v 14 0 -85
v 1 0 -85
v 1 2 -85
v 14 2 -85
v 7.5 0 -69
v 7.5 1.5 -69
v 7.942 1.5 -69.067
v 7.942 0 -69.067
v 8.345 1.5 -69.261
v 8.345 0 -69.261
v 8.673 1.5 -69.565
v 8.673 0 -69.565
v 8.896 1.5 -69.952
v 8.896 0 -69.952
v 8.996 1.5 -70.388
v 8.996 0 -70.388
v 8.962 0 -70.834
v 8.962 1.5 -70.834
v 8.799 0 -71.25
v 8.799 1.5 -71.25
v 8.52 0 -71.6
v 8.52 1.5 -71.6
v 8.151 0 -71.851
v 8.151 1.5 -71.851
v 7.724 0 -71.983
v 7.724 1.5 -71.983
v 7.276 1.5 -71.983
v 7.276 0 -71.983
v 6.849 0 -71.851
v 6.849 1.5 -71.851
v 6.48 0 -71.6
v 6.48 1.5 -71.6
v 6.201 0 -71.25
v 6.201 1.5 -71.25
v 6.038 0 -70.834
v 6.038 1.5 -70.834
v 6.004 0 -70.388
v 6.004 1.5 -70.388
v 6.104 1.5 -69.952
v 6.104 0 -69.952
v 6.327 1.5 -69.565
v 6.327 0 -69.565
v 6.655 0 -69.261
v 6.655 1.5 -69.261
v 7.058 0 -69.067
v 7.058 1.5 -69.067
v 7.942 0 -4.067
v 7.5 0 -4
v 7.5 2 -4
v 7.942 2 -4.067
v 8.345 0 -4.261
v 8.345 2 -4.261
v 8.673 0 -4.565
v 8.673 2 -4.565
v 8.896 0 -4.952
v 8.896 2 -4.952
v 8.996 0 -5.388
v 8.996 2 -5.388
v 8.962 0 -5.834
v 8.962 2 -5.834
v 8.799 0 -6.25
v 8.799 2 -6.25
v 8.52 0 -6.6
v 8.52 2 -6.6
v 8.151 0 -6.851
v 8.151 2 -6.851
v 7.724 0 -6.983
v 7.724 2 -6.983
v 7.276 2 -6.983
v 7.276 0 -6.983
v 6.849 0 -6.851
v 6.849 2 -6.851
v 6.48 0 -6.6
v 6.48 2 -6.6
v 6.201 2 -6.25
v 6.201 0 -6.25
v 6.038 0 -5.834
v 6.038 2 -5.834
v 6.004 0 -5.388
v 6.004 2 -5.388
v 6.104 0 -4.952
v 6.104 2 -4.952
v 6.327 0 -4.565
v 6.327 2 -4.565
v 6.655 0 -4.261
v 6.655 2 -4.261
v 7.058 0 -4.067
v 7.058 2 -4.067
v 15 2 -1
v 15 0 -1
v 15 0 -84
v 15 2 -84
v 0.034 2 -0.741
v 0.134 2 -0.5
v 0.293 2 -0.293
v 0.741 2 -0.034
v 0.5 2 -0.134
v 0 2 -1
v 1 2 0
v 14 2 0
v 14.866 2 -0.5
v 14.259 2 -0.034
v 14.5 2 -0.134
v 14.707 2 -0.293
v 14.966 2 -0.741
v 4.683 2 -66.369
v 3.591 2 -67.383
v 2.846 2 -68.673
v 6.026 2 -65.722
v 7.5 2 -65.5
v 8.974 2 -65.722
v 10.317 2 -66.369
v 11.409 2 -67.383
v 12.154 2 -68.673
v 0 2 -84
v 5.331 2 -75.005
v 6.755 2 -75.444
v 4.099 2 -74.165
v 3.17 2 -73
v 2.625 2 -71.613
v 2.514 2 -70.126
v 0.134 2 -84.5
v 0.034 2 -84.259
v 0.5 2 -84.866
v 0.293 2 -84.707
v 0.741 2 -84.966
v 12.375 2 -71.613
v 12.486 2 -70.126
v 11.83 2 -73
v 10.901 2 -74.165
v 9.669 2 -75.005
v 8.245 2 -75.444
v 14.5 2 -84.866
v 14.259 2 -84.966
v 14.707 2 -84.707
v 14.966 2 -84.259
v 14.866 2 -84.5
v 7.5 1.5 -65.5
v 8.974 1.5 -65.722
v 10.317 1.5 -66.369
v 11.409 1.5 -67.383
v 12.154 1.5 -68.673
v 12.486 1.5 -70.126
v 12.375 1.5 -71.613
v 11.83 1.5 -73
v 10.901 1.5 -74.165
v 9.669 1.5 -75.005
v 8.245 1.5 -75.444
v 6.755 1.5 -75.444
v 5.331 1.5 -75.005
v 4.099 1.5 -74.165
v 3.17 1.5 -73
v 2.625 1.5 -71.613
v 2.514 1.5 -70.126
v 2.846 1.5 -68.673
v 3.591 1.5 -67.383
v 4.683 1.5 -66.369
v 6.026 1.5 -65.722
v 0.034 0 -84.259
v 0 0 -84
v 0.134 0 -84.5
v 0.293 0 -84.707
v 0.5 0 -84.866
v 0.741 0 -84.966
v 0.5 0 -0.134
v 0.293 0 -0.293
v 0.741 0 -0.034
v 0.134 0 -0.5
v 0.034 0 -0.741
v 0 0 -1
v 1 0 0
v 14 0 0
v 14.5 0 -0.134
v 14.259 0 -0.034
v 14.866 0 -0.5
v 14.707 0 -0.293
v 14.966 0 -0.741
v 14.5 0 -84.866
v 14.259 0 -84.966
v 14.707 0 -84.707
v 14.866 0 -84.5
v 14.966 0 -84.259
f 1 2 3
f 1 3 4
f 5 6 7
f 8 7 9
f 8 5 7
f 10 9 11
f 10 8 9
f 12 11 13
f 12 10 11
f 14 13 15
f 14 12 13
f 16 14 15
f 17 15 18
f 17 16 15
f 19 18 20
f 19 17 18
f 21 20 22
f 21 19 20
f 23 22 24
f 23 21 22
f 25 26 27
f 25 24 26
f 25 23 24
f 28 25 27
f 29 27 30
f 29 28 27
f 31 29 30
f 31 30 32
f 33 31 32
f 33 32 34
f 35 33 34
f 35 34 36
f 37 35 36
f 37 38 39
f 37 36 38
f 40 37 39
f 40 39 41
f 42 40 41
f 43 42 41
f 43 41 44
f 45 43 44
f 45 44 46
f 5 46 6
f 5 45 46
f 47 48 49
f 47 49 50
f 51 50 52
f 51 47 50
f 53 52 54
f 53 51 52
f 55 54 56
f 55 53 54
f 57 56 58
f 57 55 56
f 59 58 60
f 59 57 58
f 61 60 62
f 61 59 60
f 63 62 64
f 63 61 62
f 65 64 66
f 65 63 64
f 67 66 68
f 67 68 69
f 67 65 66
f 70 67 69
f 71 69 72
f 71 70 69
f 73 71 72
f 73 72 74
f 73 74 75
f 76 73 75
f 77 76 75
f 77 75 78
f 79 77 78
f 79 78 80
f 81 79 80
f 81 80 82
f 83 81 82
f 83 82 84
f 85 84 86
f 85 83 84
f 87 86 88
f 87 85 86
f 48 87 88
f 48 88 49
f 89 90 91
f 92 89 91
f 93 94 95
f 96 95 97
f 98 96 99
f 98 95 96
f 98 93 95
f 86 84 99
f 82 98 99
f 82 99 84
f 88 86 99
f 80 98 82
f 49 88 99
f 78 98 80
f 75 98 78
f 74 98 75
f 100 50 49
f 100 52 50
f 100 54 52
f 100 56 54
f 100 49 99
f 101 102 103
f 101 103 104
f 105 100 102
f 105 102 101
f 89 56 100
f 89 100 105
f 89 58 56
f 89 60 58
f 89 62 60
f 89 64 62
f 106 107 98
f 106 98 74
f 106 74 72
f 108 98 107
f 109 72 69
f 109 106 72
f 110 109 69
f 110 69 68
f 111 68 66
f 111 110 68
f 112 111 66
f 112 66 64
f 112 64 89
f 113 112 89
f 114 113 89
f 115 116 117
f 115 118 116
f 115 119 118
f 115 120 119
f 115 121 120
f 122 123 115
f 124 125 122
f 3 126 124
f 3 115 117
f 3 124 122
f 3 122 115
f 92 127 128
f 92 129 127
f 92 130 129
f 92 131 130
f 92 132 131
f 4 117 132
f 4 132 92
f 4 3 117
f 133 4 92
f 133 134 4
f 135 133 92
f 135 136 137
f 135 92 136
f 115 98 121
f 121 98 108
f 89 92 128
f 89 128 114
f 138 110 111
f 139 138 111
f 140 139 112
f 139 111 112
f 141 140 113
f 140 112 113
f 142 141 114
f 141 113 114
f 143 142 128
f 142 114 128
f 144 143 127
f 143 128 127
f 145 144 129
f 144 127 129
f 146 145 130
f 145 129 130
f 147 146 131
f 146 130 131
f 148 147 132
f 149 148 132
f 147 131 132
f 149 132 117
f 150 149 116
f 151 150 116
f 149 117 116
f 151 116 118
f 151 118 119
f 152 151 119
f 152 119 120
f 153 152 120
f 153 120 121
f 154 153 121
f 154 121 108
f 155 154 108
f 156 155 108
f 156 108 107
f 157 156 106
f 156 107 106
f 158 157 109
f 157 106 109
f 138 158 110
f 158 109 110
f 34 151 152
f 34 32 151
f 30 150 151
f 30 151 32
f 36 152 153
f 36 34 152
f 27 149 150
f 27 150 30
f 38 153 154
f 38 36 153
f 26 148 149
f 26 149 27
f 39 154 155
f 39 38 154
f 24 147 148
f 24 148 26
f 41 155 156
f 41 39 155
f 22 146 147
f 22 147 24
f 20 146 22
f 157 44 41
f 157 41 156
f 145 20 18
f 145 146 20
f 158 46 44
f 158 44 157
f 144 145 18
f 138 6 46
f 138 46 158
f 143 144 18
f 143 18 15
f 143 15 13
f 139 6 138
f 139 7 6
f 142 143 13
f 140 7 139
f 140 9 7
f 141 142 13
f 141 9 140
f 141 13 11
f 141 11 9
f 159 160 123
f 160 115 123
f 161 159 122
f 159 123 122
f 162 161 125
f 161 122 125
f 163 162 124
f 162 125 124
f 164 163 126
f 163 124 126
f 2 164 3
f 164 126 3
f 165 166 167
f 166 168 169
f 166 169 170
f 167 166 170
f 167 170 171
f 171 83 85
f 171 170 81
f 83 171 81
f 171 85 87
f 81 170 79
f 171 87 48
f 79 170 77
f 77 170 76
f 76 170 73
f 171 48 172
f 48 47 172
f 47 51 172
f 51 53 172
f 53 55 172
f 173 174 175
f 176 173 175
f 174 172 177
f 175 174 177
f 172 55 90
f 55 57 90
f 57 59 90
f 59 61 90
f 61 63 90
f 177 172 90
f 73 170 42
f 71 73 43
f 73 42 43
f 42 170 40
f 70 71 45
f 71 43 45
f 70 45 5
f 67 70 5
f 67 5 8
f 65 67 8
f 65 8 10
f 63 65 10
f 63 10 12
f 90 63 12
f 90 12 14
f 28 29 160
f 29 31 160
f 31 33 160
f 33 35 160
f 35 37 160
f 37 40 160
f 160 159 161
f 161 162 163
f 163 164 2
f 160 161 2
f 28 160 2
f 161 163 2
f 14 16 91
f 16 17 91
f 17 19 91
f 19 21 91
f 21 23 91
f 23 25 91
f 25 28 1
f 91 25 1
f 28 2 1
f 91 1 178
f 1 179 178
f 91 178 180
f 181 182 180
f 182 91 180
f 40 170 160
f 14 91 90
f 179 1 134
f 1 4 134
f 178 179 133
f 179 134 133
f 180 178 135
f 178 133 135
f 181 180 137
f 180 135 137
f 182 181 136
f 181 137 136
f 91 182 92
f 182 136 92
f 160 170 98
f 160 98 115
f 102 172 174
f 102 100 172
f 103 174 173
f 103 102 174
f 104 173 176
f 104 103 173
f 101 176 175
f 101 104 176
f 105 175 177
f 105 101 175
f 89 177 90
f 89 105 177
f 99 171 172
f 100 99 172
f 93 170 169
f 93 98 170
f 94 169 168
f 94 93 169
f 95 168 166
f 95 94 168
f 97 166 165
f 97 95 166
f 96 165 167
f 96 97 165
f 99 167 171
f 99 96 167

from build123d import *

# Parameters (mm, degrees)
SKETCH1_W           = 15
SKETCH1_H           = 85
SKETCH1_R           = 1.5
BOSS_EXTRUDE1_DEPTH = 2
SKETCH2_R           = 5
CUT_EXTRUDE1_DEPTH  = 0.5
FILLET1_R           = 1


with BuildPart() as part:
    # Sketch1 → Boss-Extrude1 (new body)
    with BuildSketch(Plane(origin=(0, 0, 0), x_dir=(1, 0, 0), z_dir=(0, 1, 0))):
        with Locations((7.5, 42.5)):
            Rectangle(SKETCH1_W, SKETCH1_H)
        with Locations(Location((7.5, 70.5, 0), (0, 0, 270))):
            Circle(SKETCH1_R, mode=Mode.SUBTRACT)
        with Locations(Location((7.5, 5.5, 0), (0, 0, 270))):
            Circle(SKETCH1_R, mode=Mode.SUBTRACT)
    extrude(amount=BOSS_EXTRUDE1_DEPTH)

    # Sketch2 → Cut-Extrude1 (cut)
    with BuildSketch(Plane(origin=(0, 2, 0), x_dir=(1, 0, 0), z_dir=(0, 1, 0))):
        with Locations(Location((7.5, 70.5, 0), (0, 0, 270))):
            Circle(SKETCH2_R)
    extrude(amount=-CUT_EXTRUDE1_DEPTH, mode=Mode.SUBTRACT)

    # Fillet1
    fillet1_edges = [part.edges().sort_by_distance(p)[0] for p in [
        (0, 1, -85),
        (15, 1, -85),
        (15, 1, 0),
        (0, 1, 0),
    ]]
    fillet(fillet1_edges, radius=FILLET1_R)


solid = part.part
